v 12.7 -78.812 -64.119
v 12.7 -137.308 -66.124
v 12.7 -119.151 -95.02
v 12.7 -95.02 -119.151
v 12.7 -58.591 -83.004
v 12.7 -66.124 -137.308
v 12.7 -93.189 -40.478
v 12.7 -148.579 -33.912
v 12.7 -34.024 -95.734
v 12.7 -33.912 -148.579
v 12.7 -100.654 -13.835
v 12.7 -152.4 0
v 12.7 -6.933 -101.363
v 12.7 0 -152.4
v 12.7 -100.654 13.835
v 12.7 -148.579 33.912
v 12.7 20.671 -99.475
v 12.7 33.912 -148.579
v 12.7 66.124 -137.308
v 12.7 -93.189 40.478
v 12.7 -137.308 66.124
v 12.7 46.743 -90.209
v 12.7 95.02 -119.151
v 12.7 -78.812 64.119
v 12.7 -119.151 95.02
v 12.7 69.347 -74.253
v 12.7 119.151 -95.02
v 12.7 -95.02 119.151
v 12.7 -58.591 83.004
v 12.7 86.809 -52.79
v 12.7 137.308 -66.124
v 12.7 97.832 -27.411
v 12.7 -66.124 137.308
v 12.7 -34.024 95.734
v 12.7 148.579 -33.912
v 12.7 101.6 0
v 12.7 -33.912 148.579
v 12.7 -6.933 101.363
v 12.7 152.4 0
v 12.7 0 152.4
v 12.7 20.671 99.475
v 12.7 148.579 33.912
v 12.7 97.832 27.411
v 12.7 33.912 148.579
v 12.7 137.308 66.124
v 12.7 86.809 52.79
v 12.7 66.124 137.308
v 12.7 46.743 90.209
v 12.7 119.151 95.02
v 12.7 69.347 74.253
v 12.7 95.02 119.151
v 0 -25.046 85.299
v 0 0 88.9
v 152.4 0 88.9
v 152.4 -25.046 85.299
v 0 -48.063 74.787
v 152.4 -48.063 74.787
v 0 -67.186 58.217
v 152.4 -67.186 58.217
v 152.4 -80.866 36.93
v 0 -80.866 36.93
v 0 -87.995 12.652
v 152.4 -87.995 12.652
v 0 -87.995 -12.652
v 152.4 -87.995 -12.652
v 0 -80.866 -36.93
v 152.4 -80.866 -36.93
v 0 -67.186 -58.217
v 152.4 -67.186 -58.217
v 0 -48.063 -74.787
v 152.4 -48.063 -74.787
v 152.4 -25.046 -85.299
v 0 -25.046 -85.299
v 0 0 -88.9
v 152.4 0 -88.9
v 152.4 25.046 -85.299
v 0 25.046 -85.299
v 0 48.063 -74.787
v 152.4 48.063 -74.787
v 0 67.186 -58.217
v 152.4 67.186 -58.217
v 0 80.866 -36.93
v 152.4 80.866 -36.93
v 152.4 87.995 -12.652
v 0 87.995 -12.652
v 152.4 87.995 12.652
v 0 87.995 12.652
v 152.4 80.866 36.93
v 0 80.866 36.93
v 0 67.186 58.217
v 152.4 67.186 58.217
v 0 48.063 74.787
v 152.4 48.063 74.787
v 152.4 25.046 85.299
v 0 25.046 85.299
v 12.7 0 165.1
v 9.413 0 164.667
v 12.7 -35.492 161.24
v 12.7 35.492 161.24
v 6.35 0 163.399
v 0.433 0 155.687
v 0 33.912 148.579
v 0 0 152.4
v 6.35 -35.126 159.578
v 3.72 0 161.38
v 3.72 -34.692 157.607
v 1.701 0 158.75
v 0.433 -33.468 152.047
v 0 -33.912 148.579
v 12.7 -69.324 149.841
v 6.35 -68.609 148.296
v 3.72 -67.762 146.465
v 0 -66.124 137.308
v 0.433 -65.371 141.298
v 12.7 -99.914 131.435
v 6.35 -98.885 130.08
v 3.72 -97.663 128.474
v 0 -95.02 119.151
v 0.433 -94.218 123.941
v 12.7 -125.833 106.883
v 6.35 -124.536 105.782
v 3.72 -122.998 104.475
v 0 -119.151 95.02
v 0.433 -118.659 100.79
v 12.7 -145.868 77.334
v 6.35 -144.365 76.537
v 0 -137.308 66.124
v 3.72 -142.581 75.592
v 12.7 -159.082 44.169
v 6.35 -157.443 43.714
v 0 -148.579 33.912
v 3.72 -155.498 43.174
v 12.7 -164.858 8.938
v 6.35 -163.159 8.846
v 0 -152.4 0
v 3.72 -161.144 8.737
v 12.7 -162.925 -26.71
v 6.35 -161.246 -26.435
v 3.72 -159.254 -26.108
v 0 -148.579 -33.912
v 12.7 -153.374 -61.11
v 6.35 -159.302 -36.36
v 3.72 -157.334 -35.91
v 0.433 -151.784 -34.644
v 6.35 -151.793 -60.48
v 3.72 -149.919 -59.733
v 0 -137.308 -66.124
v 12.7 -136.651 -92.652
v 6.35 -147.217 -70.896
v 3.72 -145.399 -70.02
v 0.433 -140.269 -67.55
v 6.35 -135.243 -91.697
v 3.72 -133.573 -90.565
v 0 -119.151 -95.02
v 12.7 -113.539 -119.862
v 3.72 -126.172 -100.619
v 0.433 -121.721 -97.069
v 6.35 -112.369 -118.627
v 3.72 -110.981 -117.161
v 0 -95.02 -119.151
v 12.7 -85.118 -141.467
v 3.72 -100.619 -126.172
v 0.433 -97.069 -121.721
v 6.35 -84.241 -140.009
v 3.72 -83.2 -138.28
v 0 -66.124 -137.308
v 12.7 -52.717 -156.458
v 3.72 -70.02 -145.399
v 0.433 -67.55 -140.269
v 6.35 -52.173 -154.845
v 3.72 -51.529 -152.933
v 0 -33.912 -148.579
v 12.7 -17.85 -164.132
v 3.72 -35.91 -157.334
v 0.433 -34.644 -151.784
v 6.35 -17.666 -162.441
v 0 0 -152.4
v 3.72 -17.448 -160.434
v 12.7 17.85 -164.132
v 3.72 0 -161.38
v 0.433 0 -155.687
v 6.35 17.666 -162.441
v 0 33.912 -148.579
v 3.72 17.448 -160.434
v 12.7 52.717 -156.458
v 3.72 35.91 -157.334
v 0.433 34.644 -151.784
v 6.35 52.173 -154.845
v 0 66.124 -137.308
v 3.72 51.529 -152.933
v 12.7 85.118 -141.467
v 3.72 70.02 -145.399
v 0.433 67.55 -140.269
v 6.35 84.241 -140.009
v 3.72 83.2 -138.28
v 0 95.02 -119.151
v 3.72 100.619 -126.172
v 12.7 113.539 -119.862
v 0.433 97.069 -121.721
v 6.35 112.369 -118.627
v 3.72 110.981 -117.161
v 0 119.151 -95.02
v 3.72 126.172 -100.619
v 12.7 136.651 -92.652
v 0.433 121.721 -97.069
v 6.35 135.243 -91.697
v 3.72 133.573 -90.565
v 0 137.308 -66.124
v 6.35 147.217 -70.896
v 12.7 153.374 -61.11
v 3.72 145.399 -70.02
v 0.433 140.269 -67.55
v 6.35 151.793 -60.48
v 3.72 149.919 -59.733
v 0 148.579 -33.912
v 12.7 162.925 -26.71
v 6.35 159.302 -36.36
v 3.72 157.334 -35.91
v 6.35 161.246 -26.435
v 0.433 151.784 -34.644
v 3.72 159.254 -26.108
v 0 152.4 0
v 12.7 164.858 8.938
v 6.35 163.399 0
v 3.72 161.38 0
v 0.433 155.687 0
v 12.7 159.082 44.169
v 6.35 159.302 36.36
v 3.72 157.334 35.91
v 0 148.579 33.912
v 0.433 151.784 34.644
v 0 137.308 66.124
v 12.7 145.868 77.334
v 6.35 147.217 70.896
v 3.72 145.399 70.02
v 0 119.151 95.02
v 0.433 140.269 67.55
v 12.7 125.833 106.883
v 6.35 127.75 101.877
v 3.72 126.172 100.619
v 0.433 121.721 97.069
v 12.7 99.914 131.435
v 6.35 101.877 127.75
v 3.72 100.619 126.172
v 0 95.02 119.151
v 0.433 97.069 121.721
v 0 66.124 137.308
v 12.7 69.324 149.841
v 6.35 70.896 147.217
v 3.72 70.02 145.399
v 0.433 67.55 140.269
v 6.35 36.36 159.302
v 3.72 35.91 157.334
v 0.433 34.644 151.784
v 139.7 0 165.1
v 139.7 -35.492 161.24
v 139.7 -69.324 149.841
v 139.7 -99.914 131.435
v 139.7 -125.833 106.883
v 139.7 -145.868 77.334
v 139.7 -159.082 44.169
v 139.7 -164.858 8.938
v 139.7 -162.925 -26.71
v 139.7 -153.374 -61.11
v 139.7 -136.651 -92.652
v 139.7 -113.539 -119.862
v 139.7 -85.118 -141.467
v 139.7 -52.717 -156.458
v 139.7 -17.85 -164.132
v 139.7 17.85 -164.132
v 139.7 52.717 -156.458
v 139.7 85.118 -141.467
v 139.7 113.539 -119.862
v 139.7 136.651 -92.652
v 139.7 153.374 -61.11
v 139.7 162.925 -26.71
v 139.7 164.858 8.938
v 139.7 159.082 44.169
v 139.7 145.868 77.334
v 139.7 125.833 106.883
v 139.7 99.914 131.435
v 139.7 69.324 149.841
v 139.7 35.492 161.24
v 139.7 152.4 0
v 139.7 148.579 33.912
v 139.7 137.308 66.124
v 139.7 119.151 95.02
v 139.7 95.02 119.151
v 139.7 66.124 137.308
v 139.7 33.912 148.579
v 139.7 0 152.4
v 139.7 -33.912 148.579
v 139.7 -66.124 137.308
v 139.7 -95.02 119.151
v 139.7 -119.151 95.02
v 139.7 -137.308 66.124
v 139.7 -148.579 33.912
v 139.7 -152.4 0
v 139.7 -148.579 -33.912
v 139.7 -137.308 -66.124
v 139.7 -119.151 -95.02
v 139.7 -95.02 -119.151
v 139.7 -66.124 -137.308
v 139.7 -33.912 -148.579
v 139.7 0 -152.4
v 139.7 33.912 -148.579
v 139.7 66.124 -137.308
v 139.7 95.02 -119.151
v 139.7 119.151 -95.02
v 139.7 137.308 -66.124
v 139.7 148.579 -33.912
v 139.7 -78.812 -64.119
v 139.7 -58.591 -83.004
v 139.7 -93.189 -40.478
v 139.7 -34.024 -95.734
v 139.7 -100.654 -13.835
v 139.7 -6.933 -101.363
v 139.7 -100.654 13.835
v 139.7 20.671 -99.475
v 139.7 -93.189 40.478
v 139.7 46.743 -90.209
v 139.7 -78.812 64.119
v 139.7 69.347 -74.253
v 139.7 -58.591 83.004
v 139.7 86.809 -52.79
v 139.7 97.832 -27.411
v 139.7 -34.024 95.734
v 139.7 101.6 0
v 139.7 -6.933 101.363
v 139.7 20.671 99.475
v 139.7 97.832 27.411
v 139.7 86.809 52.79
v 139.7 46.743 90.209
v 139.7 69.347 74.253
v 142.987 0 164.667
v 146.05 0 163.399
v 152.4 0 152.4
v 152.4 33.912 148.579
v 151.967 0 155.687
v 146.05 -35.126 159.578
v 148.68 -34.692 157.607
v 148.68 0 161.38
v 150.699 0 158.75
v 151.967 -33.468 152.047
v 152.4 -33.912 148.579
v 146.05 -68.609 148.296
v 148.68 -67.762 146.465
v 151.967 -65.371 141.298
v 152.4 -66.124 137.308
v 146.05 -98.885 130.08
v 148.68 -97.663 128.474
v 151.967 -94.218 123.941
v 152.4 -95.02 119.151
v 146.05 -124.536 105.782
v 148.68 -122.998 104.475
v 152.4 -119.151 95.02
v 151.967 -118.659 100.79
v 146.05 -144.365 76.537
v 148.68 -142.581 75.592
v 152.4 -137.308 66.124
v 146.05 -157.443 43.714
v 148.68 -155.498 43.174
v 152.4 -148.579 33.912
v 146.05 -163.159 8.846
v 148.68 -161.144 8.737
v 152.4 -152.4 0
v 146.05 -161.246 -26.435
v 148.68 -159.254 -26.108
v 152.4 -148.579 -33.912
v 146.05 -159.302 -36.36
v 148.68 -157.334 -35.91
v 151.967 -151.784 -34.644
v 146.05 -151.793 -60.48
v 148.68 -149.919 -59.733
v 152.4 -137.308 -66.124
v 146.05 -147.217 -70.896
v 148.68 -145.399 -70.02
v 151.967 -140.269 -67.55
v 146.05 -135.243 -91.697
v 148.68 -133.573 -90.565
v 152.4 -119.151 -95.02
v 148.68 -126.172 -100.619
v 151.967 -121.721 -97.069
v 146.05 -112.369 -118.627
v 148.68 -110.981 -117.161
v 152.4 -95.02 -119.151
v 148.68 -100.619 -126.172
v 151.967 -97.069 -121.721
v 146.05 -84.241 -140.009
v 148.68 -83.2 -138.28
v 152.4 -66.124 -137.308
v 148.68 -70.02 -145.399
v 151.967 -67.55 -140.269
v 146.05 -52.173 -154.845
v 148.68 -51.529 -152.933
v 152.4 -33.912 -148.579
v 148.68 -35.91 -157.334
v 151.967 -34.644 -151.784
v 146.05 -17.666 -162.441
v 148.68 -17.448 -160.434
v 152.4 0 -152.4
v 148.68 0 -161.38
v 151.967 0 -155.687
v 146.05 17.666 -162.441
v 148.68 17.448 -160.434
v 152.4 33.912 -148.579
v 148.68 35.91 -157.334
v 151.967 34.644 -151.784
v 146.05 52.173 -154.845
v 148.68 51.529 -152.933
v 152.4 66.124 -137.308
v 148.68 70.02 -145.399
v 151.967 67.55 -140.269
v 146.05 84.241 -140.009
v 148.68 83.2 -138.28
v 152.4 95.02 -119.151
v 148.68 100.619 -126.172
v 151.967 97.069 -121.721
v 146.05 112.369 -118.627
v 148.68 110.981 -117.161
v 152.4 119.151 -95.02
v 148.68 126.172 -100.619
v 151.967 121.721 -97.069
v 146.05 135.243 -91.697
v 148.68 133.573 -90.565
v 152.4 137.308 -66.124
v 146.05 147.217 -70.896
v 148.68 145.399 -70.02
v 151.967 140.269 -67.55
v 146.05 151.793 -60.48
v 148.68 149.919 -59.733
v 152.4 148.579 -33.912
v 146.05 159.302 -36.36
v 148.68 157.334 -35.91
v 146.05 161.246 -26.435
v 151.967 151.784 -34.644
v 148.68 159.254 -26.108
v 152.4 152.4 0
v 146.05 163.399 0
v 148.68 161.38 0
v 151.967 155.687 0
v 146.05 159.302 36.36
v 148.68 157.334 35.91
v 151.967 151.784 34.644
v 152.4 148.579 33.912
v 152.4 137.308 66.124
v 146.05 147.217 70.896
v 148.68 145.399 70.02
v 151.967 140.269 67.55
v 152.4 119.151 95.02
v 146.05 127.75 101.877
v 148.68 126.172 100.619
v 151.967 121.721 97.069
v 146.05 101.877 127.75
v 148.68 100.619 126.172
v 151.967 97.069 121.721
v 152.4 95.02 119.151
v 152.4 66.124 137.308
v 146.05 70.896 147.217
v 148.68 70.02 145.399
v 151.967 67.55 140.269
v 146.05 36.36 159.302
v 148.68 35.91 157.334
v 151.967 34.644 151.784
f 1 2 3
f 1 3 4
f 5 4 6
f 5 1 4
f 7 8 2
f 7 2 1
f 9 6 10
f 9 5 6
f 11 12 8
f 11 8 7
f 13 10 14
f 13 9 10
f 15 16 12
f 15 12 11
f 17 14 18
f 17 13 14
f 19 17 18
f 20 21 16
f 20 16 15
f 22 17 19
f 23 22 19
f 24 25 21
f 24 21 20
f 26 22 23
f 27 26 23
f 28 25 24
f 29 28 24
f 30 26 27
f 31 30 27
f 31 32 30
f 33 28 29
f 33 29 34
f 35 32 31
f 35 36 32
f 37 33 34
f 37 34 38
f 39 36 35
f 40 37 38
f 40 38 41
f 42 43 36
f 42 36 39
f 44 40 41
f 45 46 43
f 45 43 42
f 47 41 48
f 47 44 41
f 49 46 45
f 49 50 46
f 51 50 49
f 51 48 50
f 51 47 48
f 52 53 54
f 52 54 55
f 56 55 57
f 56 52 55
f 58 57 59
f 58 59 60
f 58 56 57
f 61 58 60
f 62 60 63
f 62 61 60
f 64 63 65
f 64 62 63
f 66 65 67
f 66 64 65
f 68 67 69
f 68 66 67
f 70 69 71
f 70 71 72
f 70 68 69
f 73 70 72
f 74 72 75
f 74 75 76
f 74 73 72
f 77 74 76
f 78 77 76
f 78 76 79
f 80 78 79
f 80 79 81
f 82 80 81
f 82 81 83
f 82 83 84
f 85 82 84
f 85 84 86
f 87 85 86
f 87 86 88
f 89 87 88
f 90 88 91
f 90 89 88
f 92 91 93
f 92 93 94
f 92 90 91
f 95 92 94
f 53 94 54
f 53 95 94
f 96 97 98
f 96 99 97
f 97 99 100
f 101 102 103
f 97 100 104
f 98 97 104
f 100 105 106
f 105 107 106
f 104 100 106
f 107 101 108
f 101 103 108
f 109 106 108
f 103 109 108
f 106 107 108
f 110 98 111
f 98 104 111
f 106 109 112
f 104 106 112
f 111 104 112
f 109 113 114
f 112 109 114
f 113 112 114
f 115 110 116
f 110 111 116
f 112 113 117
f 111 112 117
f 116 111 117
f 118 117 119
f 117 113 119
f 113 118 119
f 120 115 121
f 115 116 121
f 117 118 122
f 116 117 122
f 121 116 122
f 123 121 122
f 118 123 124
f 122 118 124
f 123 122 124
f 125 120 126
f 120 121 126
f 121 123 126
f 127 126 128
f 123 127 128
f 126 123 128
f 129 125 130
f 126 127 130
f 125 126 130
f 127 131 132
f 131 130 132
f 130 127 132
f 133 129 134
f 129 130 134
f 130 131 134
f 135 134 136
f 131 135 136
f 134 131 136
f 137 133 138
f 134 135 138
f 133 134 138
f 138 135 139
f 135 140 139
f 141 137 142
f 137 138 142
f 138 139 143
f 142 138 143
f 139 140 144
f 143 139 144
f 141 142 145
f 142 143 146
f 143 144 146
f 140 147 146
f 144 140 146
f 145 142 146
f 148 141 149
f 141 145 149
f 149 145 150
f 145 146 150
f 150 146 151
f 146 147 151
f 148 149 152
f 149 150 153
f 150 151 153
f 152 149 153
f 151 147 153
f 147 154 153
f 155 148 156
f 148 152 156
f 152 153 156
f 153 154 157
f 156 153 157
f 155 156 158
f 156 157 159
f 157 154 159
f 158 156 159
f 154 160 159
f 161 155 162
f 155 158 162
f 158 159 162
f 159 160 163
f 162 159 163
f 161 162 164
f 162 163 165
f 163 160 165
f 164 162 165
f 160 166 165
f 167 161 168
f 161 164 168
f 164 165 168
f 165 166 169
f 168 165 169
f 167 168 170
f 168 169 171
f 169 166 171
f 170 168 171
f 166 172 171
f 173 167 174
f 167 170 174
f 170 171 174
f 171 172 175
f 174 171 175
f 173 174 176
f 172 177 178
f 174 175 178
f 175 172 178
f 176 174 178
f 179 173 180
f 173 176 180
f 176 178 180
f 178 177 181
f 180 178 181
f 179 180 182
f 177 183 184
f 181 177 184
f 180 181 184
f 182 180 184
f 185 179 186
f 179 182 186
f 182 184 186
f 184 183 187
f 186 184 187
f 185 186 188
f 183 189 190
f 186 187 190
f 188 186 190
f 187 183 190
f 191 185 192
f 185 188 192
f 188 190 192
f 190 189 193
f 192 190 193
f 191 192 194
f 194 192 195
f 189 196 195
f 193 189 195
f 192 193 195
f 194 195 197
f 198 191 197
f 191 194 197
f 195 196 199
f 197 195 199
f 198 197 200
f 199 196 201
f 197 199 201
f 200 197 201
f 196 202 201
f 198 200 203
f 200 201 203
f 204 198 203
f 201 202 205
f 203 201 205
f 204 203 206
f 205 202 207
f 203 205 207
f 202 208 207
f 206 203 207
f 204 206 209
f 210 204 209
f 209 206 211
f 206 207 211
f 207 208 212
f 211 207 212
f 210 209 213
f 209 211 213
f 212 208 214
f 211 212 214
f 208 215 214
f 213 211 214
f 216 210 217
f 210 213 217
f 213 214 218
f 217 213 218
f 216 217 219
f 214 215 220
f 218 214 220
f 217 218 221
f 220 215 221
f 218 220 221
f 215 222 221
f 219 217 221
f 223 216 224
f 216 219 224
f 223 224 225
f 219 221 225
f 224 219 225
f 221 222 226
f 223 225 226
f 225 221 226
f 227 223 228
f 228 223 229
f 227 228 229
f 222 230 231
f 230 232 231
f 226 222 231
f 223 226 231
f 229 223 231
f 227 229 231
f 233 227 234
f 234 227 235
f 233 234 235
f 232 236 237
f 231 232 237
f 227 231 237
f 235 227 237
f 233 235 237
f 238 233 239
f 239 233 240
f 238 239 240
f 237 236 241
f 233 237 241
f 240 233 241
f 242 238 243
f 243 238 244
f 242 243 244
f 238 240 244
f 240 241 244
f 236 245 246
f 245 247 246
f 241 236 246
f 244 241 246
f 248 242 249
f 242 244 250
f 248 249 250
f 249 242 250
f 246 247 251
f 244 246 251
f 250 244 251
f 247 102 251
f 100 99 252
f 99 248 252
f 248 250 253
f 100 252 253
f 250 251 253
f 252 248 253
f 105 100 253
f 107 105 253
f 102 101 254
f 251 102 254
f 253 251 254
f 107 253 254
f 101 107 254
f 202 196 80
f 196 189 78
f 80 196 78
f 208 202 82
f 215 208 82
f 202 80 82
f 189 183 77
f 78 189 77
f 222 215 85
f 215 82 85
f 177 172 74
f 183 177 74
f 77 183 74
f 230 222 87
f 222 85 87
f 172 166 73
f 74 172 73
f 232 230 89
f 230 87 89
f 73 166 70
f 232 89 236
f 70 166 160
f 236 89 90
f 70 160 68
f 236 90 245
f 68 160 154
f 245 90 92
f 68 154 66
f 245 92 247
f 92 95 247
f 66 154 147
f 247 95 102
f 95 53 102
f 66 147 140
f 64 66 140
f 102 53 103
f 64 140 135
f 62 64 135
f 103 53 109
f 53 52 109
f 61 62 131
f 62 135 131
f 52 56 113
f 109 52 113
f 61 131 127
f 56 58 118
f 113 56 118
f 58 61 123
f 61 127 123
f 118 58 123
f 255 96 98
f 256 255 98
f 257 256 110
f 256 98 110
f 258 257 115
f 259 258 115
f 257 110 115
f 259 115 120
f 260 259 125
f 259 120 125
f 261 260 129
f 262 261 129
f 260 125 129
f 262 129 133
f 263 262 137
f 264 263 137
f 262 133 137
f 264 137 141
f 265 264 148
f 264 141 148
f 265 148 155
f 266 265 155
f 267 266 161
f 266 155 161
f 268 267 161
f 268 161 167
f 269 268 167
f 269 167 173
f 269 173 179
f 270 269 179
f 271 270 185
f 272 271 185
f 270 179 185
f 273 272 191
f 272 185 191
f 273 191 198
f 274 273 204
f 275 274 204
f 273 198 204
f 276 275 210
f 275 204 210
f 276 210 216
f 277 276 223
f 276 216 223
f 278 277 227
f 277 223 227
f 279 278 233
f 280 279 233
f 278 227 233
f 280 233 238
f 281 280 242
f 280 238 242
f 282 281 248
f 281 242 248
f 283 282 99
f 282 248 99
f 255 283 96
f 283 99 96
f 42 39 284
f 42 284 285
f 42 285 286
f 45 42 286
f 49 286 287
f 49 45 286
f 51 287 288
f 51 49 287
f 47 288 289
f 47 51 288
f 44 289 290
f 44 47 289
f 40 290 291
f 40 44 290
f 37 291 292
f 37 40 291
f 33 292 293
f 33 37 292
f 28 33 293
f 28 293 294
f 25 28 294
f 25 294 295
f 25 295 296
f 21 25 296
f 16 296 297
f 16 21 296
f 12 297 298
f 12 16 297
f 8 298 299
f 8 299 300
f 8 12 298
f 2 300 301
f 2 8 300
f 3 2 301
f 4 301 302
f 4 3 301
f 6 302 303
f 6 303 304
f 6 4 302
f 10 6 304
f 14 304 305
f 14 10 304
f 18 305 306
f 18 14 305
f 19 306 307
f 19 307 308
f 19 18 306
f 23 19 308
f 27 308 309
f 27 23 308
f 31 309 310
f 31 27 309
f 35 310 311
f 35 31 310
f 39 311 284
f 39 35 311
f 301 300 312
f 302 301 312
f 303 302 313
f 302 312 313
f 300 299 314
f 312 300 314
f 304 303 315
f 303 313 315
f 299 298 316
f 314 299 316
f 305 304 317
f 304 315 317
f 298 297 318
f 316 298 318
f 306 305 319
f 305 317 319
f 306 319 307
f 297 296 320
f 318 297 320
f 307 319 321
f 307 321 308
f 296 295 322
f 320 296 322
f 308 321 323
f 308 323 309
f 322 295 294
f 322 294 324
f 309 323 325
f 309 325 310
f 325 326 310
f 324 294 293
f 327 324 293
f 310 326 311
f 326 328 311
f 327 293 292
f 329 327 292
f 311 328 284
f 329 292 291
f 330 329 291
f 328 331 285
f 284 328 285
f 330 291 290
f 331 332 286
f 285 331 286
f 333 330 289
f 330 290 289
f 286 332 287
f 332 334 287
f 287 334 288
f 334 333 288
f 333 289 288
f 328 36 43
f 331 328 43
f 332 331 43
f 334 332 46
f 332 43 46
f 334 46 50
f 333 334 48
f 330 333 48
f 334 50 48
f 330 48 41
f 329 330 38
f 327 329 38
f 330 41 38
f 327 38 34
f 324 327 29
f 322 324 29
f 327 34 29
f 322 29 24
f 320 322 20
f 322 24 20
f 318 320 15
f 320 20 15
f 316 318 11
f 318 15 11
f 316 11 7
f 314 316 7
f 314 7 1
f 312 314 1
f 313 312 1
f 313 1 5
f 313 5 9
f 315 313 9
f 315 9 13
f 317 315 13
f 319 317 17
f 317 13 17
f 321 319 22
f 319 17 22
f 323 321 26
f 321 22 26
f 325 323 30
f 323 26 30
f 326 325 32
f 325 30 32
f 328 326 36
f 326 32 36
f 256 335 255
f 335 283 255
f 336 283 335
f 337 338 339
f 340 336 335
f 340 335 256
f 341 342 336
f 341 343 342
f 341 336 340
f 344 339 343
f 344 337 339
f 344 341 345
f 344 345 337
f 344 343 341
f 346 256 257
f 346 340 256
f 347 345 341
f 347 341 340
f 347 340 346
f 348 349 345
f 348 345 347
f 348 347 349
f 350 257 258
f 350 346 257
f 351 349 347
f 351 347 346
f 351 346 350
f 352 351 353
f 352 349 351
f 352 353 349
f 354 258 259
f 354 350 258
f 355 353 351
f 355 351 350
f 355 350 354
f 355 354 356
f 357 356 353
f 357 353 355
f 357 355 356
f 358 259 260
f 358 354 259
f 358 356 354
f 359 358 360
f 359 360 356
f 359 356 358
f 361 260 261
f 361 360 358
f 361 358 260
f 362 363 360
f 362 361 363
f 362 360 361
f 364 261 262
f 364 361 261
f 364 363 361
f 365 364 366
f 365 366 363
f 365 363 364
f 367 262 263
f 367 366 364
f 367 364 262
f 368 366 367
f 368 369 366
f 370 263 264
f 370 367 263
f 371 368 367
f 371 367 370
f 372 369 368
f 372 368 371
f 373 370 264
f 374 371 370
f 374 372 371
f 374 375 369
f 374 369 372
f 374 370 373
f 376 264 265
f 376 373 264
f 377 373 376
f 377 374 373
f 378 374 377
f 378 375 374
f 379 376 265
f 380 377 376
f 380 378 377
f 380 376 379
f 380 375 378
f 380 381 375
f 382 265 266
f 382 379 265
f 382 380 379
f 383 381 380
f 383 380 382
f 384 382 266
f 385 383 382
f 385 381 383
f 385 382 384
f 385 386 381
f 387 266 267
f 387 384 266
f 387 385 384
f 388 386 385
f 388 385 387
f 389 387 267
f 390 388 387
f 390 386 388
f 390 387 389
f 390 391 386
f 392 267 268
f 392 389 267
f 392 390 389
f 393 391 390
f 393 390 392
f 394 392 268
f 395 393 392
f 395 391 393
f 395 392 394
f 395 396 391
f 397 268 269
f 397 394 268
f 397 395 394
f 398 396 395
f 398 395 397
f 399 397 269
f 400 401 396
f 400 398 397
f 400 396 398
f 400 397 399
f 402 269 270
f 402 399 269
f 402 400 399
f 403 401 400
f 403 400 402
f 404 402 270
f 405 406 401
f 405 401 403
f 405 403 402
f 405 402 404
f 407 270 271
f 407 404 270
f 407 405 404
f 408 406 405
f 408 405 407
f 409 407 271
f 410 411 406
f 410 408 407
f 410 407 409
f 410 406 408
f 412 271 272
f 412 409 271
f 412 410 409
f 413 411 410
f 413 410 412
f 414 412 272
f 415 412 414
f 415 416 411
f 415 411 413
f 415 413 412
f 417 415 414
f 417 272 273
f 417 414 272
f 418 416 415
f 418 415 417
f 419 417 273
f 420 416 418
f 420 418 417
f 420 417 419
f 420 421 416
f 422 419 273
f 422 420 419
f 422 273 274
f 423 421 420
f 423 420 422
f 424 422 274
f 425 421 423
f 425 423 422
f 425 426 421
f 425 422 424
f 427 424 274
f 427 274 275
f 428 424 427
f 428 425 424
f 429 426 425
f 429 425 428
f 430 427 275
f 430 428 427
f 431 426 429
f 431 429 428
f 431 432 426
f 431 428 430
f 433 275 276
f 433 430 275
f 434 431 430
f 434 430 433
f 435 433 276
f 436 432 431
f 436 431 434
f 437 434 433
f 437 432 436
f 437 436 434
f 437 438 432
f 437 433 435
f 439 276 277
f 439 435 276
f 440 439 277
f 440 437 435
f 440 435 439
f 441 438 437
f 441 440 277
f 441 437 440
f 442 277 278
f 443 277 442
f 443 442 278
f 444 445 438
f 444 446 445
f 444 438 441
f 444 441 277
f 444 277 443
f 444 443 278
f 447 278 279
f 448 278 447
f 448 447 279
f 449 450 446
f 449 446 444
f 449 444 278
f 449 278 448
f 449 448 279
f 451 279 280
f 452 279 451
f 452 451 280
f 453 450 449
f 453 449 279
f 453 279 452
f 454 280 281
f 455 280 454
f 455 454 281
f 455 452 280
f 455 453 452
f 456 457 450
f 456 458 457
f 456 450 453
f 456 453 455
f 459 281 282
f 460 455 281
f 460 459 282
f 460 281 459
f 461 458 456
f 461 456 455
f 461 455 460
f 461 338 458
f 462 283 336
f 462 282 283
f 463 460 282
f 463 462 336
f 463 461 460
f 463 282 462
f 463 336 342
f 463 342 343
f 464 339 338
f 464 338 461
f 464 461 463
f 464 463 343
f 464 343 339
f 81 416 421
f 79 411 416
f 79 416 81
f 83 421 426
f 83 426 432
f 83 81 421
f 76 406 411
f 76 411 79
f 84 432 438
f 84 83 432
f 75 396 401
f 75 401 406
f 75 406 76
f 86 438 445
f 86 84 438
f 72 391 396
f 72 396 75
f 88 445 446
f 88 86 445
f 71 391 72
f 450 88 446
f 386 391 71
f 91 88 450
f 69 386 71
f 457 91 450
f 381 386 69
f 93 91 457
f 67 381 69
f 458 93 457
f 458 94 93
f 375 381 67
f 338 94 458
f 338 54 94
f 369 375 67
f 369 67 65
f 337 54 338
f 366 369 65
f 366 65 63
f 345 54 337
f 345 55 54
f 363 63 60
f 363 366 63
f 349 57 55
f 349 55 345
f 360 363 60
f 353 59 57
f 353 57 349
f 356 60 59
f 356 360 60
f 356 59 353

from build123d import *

# Parameters (mm, degrees)
SKETCH1_R           = 165.1
SKETCH1_R_2         = 88.9
BOSS_EXTRUDE1_DEPTH = 152.4
FILLET1_R           = 12.7
SHELL2_START        = 12.7
SHELL2_OUTLINE_R    = 152.4
SHELL2_OUTLINE_R_2  = 101.6
SHELL2_DEPTH        = 127


# Read off the part's stored shape, not the designer's step: Shell2
with BuildPart() as part:
    # Sketch1 → Boss-Extrude1 (new body)
    with BuildSketch(Plane(origin=(0, 0, 0), x_dir=(0, 0, -1), z_dir=(1, 0, 0))):
        with Locations(Location((0, 0, 0), (0, 0, 180))):
            Circle(SKETCH1_R)
        with Locations(Location((0, 0, 0), (0, 0, 180))):
            Circle(SKETCH1_R_2, mode=Mode.SUBTRACT)
    extrude(amount=BOSS_EXTRUDE1_DEPTH)

    # Fillet1
    fillet1_edges = [part.edges().sort_by_distance(p)[0] for p in [
        (0, 0, -165.1),
        (152.4, 0, -165.1),
    ]]
    fillet(fillet1_edges, radius=FILLET1_R)

    # Shell2 outline → Shell2 (cut)
    with BuildSketch(Plane.YZ.offset(SHELL2_START)):
        Circle(SHELL2_OUTLINE_R)
        Circle(SHELL2_OUTLINE_R_2, mode=Mode.SUBTRACT)
    extrude(amount=SHELL2_DEPTH, mode=Mode.SUBTRACT)


solid = part.part
